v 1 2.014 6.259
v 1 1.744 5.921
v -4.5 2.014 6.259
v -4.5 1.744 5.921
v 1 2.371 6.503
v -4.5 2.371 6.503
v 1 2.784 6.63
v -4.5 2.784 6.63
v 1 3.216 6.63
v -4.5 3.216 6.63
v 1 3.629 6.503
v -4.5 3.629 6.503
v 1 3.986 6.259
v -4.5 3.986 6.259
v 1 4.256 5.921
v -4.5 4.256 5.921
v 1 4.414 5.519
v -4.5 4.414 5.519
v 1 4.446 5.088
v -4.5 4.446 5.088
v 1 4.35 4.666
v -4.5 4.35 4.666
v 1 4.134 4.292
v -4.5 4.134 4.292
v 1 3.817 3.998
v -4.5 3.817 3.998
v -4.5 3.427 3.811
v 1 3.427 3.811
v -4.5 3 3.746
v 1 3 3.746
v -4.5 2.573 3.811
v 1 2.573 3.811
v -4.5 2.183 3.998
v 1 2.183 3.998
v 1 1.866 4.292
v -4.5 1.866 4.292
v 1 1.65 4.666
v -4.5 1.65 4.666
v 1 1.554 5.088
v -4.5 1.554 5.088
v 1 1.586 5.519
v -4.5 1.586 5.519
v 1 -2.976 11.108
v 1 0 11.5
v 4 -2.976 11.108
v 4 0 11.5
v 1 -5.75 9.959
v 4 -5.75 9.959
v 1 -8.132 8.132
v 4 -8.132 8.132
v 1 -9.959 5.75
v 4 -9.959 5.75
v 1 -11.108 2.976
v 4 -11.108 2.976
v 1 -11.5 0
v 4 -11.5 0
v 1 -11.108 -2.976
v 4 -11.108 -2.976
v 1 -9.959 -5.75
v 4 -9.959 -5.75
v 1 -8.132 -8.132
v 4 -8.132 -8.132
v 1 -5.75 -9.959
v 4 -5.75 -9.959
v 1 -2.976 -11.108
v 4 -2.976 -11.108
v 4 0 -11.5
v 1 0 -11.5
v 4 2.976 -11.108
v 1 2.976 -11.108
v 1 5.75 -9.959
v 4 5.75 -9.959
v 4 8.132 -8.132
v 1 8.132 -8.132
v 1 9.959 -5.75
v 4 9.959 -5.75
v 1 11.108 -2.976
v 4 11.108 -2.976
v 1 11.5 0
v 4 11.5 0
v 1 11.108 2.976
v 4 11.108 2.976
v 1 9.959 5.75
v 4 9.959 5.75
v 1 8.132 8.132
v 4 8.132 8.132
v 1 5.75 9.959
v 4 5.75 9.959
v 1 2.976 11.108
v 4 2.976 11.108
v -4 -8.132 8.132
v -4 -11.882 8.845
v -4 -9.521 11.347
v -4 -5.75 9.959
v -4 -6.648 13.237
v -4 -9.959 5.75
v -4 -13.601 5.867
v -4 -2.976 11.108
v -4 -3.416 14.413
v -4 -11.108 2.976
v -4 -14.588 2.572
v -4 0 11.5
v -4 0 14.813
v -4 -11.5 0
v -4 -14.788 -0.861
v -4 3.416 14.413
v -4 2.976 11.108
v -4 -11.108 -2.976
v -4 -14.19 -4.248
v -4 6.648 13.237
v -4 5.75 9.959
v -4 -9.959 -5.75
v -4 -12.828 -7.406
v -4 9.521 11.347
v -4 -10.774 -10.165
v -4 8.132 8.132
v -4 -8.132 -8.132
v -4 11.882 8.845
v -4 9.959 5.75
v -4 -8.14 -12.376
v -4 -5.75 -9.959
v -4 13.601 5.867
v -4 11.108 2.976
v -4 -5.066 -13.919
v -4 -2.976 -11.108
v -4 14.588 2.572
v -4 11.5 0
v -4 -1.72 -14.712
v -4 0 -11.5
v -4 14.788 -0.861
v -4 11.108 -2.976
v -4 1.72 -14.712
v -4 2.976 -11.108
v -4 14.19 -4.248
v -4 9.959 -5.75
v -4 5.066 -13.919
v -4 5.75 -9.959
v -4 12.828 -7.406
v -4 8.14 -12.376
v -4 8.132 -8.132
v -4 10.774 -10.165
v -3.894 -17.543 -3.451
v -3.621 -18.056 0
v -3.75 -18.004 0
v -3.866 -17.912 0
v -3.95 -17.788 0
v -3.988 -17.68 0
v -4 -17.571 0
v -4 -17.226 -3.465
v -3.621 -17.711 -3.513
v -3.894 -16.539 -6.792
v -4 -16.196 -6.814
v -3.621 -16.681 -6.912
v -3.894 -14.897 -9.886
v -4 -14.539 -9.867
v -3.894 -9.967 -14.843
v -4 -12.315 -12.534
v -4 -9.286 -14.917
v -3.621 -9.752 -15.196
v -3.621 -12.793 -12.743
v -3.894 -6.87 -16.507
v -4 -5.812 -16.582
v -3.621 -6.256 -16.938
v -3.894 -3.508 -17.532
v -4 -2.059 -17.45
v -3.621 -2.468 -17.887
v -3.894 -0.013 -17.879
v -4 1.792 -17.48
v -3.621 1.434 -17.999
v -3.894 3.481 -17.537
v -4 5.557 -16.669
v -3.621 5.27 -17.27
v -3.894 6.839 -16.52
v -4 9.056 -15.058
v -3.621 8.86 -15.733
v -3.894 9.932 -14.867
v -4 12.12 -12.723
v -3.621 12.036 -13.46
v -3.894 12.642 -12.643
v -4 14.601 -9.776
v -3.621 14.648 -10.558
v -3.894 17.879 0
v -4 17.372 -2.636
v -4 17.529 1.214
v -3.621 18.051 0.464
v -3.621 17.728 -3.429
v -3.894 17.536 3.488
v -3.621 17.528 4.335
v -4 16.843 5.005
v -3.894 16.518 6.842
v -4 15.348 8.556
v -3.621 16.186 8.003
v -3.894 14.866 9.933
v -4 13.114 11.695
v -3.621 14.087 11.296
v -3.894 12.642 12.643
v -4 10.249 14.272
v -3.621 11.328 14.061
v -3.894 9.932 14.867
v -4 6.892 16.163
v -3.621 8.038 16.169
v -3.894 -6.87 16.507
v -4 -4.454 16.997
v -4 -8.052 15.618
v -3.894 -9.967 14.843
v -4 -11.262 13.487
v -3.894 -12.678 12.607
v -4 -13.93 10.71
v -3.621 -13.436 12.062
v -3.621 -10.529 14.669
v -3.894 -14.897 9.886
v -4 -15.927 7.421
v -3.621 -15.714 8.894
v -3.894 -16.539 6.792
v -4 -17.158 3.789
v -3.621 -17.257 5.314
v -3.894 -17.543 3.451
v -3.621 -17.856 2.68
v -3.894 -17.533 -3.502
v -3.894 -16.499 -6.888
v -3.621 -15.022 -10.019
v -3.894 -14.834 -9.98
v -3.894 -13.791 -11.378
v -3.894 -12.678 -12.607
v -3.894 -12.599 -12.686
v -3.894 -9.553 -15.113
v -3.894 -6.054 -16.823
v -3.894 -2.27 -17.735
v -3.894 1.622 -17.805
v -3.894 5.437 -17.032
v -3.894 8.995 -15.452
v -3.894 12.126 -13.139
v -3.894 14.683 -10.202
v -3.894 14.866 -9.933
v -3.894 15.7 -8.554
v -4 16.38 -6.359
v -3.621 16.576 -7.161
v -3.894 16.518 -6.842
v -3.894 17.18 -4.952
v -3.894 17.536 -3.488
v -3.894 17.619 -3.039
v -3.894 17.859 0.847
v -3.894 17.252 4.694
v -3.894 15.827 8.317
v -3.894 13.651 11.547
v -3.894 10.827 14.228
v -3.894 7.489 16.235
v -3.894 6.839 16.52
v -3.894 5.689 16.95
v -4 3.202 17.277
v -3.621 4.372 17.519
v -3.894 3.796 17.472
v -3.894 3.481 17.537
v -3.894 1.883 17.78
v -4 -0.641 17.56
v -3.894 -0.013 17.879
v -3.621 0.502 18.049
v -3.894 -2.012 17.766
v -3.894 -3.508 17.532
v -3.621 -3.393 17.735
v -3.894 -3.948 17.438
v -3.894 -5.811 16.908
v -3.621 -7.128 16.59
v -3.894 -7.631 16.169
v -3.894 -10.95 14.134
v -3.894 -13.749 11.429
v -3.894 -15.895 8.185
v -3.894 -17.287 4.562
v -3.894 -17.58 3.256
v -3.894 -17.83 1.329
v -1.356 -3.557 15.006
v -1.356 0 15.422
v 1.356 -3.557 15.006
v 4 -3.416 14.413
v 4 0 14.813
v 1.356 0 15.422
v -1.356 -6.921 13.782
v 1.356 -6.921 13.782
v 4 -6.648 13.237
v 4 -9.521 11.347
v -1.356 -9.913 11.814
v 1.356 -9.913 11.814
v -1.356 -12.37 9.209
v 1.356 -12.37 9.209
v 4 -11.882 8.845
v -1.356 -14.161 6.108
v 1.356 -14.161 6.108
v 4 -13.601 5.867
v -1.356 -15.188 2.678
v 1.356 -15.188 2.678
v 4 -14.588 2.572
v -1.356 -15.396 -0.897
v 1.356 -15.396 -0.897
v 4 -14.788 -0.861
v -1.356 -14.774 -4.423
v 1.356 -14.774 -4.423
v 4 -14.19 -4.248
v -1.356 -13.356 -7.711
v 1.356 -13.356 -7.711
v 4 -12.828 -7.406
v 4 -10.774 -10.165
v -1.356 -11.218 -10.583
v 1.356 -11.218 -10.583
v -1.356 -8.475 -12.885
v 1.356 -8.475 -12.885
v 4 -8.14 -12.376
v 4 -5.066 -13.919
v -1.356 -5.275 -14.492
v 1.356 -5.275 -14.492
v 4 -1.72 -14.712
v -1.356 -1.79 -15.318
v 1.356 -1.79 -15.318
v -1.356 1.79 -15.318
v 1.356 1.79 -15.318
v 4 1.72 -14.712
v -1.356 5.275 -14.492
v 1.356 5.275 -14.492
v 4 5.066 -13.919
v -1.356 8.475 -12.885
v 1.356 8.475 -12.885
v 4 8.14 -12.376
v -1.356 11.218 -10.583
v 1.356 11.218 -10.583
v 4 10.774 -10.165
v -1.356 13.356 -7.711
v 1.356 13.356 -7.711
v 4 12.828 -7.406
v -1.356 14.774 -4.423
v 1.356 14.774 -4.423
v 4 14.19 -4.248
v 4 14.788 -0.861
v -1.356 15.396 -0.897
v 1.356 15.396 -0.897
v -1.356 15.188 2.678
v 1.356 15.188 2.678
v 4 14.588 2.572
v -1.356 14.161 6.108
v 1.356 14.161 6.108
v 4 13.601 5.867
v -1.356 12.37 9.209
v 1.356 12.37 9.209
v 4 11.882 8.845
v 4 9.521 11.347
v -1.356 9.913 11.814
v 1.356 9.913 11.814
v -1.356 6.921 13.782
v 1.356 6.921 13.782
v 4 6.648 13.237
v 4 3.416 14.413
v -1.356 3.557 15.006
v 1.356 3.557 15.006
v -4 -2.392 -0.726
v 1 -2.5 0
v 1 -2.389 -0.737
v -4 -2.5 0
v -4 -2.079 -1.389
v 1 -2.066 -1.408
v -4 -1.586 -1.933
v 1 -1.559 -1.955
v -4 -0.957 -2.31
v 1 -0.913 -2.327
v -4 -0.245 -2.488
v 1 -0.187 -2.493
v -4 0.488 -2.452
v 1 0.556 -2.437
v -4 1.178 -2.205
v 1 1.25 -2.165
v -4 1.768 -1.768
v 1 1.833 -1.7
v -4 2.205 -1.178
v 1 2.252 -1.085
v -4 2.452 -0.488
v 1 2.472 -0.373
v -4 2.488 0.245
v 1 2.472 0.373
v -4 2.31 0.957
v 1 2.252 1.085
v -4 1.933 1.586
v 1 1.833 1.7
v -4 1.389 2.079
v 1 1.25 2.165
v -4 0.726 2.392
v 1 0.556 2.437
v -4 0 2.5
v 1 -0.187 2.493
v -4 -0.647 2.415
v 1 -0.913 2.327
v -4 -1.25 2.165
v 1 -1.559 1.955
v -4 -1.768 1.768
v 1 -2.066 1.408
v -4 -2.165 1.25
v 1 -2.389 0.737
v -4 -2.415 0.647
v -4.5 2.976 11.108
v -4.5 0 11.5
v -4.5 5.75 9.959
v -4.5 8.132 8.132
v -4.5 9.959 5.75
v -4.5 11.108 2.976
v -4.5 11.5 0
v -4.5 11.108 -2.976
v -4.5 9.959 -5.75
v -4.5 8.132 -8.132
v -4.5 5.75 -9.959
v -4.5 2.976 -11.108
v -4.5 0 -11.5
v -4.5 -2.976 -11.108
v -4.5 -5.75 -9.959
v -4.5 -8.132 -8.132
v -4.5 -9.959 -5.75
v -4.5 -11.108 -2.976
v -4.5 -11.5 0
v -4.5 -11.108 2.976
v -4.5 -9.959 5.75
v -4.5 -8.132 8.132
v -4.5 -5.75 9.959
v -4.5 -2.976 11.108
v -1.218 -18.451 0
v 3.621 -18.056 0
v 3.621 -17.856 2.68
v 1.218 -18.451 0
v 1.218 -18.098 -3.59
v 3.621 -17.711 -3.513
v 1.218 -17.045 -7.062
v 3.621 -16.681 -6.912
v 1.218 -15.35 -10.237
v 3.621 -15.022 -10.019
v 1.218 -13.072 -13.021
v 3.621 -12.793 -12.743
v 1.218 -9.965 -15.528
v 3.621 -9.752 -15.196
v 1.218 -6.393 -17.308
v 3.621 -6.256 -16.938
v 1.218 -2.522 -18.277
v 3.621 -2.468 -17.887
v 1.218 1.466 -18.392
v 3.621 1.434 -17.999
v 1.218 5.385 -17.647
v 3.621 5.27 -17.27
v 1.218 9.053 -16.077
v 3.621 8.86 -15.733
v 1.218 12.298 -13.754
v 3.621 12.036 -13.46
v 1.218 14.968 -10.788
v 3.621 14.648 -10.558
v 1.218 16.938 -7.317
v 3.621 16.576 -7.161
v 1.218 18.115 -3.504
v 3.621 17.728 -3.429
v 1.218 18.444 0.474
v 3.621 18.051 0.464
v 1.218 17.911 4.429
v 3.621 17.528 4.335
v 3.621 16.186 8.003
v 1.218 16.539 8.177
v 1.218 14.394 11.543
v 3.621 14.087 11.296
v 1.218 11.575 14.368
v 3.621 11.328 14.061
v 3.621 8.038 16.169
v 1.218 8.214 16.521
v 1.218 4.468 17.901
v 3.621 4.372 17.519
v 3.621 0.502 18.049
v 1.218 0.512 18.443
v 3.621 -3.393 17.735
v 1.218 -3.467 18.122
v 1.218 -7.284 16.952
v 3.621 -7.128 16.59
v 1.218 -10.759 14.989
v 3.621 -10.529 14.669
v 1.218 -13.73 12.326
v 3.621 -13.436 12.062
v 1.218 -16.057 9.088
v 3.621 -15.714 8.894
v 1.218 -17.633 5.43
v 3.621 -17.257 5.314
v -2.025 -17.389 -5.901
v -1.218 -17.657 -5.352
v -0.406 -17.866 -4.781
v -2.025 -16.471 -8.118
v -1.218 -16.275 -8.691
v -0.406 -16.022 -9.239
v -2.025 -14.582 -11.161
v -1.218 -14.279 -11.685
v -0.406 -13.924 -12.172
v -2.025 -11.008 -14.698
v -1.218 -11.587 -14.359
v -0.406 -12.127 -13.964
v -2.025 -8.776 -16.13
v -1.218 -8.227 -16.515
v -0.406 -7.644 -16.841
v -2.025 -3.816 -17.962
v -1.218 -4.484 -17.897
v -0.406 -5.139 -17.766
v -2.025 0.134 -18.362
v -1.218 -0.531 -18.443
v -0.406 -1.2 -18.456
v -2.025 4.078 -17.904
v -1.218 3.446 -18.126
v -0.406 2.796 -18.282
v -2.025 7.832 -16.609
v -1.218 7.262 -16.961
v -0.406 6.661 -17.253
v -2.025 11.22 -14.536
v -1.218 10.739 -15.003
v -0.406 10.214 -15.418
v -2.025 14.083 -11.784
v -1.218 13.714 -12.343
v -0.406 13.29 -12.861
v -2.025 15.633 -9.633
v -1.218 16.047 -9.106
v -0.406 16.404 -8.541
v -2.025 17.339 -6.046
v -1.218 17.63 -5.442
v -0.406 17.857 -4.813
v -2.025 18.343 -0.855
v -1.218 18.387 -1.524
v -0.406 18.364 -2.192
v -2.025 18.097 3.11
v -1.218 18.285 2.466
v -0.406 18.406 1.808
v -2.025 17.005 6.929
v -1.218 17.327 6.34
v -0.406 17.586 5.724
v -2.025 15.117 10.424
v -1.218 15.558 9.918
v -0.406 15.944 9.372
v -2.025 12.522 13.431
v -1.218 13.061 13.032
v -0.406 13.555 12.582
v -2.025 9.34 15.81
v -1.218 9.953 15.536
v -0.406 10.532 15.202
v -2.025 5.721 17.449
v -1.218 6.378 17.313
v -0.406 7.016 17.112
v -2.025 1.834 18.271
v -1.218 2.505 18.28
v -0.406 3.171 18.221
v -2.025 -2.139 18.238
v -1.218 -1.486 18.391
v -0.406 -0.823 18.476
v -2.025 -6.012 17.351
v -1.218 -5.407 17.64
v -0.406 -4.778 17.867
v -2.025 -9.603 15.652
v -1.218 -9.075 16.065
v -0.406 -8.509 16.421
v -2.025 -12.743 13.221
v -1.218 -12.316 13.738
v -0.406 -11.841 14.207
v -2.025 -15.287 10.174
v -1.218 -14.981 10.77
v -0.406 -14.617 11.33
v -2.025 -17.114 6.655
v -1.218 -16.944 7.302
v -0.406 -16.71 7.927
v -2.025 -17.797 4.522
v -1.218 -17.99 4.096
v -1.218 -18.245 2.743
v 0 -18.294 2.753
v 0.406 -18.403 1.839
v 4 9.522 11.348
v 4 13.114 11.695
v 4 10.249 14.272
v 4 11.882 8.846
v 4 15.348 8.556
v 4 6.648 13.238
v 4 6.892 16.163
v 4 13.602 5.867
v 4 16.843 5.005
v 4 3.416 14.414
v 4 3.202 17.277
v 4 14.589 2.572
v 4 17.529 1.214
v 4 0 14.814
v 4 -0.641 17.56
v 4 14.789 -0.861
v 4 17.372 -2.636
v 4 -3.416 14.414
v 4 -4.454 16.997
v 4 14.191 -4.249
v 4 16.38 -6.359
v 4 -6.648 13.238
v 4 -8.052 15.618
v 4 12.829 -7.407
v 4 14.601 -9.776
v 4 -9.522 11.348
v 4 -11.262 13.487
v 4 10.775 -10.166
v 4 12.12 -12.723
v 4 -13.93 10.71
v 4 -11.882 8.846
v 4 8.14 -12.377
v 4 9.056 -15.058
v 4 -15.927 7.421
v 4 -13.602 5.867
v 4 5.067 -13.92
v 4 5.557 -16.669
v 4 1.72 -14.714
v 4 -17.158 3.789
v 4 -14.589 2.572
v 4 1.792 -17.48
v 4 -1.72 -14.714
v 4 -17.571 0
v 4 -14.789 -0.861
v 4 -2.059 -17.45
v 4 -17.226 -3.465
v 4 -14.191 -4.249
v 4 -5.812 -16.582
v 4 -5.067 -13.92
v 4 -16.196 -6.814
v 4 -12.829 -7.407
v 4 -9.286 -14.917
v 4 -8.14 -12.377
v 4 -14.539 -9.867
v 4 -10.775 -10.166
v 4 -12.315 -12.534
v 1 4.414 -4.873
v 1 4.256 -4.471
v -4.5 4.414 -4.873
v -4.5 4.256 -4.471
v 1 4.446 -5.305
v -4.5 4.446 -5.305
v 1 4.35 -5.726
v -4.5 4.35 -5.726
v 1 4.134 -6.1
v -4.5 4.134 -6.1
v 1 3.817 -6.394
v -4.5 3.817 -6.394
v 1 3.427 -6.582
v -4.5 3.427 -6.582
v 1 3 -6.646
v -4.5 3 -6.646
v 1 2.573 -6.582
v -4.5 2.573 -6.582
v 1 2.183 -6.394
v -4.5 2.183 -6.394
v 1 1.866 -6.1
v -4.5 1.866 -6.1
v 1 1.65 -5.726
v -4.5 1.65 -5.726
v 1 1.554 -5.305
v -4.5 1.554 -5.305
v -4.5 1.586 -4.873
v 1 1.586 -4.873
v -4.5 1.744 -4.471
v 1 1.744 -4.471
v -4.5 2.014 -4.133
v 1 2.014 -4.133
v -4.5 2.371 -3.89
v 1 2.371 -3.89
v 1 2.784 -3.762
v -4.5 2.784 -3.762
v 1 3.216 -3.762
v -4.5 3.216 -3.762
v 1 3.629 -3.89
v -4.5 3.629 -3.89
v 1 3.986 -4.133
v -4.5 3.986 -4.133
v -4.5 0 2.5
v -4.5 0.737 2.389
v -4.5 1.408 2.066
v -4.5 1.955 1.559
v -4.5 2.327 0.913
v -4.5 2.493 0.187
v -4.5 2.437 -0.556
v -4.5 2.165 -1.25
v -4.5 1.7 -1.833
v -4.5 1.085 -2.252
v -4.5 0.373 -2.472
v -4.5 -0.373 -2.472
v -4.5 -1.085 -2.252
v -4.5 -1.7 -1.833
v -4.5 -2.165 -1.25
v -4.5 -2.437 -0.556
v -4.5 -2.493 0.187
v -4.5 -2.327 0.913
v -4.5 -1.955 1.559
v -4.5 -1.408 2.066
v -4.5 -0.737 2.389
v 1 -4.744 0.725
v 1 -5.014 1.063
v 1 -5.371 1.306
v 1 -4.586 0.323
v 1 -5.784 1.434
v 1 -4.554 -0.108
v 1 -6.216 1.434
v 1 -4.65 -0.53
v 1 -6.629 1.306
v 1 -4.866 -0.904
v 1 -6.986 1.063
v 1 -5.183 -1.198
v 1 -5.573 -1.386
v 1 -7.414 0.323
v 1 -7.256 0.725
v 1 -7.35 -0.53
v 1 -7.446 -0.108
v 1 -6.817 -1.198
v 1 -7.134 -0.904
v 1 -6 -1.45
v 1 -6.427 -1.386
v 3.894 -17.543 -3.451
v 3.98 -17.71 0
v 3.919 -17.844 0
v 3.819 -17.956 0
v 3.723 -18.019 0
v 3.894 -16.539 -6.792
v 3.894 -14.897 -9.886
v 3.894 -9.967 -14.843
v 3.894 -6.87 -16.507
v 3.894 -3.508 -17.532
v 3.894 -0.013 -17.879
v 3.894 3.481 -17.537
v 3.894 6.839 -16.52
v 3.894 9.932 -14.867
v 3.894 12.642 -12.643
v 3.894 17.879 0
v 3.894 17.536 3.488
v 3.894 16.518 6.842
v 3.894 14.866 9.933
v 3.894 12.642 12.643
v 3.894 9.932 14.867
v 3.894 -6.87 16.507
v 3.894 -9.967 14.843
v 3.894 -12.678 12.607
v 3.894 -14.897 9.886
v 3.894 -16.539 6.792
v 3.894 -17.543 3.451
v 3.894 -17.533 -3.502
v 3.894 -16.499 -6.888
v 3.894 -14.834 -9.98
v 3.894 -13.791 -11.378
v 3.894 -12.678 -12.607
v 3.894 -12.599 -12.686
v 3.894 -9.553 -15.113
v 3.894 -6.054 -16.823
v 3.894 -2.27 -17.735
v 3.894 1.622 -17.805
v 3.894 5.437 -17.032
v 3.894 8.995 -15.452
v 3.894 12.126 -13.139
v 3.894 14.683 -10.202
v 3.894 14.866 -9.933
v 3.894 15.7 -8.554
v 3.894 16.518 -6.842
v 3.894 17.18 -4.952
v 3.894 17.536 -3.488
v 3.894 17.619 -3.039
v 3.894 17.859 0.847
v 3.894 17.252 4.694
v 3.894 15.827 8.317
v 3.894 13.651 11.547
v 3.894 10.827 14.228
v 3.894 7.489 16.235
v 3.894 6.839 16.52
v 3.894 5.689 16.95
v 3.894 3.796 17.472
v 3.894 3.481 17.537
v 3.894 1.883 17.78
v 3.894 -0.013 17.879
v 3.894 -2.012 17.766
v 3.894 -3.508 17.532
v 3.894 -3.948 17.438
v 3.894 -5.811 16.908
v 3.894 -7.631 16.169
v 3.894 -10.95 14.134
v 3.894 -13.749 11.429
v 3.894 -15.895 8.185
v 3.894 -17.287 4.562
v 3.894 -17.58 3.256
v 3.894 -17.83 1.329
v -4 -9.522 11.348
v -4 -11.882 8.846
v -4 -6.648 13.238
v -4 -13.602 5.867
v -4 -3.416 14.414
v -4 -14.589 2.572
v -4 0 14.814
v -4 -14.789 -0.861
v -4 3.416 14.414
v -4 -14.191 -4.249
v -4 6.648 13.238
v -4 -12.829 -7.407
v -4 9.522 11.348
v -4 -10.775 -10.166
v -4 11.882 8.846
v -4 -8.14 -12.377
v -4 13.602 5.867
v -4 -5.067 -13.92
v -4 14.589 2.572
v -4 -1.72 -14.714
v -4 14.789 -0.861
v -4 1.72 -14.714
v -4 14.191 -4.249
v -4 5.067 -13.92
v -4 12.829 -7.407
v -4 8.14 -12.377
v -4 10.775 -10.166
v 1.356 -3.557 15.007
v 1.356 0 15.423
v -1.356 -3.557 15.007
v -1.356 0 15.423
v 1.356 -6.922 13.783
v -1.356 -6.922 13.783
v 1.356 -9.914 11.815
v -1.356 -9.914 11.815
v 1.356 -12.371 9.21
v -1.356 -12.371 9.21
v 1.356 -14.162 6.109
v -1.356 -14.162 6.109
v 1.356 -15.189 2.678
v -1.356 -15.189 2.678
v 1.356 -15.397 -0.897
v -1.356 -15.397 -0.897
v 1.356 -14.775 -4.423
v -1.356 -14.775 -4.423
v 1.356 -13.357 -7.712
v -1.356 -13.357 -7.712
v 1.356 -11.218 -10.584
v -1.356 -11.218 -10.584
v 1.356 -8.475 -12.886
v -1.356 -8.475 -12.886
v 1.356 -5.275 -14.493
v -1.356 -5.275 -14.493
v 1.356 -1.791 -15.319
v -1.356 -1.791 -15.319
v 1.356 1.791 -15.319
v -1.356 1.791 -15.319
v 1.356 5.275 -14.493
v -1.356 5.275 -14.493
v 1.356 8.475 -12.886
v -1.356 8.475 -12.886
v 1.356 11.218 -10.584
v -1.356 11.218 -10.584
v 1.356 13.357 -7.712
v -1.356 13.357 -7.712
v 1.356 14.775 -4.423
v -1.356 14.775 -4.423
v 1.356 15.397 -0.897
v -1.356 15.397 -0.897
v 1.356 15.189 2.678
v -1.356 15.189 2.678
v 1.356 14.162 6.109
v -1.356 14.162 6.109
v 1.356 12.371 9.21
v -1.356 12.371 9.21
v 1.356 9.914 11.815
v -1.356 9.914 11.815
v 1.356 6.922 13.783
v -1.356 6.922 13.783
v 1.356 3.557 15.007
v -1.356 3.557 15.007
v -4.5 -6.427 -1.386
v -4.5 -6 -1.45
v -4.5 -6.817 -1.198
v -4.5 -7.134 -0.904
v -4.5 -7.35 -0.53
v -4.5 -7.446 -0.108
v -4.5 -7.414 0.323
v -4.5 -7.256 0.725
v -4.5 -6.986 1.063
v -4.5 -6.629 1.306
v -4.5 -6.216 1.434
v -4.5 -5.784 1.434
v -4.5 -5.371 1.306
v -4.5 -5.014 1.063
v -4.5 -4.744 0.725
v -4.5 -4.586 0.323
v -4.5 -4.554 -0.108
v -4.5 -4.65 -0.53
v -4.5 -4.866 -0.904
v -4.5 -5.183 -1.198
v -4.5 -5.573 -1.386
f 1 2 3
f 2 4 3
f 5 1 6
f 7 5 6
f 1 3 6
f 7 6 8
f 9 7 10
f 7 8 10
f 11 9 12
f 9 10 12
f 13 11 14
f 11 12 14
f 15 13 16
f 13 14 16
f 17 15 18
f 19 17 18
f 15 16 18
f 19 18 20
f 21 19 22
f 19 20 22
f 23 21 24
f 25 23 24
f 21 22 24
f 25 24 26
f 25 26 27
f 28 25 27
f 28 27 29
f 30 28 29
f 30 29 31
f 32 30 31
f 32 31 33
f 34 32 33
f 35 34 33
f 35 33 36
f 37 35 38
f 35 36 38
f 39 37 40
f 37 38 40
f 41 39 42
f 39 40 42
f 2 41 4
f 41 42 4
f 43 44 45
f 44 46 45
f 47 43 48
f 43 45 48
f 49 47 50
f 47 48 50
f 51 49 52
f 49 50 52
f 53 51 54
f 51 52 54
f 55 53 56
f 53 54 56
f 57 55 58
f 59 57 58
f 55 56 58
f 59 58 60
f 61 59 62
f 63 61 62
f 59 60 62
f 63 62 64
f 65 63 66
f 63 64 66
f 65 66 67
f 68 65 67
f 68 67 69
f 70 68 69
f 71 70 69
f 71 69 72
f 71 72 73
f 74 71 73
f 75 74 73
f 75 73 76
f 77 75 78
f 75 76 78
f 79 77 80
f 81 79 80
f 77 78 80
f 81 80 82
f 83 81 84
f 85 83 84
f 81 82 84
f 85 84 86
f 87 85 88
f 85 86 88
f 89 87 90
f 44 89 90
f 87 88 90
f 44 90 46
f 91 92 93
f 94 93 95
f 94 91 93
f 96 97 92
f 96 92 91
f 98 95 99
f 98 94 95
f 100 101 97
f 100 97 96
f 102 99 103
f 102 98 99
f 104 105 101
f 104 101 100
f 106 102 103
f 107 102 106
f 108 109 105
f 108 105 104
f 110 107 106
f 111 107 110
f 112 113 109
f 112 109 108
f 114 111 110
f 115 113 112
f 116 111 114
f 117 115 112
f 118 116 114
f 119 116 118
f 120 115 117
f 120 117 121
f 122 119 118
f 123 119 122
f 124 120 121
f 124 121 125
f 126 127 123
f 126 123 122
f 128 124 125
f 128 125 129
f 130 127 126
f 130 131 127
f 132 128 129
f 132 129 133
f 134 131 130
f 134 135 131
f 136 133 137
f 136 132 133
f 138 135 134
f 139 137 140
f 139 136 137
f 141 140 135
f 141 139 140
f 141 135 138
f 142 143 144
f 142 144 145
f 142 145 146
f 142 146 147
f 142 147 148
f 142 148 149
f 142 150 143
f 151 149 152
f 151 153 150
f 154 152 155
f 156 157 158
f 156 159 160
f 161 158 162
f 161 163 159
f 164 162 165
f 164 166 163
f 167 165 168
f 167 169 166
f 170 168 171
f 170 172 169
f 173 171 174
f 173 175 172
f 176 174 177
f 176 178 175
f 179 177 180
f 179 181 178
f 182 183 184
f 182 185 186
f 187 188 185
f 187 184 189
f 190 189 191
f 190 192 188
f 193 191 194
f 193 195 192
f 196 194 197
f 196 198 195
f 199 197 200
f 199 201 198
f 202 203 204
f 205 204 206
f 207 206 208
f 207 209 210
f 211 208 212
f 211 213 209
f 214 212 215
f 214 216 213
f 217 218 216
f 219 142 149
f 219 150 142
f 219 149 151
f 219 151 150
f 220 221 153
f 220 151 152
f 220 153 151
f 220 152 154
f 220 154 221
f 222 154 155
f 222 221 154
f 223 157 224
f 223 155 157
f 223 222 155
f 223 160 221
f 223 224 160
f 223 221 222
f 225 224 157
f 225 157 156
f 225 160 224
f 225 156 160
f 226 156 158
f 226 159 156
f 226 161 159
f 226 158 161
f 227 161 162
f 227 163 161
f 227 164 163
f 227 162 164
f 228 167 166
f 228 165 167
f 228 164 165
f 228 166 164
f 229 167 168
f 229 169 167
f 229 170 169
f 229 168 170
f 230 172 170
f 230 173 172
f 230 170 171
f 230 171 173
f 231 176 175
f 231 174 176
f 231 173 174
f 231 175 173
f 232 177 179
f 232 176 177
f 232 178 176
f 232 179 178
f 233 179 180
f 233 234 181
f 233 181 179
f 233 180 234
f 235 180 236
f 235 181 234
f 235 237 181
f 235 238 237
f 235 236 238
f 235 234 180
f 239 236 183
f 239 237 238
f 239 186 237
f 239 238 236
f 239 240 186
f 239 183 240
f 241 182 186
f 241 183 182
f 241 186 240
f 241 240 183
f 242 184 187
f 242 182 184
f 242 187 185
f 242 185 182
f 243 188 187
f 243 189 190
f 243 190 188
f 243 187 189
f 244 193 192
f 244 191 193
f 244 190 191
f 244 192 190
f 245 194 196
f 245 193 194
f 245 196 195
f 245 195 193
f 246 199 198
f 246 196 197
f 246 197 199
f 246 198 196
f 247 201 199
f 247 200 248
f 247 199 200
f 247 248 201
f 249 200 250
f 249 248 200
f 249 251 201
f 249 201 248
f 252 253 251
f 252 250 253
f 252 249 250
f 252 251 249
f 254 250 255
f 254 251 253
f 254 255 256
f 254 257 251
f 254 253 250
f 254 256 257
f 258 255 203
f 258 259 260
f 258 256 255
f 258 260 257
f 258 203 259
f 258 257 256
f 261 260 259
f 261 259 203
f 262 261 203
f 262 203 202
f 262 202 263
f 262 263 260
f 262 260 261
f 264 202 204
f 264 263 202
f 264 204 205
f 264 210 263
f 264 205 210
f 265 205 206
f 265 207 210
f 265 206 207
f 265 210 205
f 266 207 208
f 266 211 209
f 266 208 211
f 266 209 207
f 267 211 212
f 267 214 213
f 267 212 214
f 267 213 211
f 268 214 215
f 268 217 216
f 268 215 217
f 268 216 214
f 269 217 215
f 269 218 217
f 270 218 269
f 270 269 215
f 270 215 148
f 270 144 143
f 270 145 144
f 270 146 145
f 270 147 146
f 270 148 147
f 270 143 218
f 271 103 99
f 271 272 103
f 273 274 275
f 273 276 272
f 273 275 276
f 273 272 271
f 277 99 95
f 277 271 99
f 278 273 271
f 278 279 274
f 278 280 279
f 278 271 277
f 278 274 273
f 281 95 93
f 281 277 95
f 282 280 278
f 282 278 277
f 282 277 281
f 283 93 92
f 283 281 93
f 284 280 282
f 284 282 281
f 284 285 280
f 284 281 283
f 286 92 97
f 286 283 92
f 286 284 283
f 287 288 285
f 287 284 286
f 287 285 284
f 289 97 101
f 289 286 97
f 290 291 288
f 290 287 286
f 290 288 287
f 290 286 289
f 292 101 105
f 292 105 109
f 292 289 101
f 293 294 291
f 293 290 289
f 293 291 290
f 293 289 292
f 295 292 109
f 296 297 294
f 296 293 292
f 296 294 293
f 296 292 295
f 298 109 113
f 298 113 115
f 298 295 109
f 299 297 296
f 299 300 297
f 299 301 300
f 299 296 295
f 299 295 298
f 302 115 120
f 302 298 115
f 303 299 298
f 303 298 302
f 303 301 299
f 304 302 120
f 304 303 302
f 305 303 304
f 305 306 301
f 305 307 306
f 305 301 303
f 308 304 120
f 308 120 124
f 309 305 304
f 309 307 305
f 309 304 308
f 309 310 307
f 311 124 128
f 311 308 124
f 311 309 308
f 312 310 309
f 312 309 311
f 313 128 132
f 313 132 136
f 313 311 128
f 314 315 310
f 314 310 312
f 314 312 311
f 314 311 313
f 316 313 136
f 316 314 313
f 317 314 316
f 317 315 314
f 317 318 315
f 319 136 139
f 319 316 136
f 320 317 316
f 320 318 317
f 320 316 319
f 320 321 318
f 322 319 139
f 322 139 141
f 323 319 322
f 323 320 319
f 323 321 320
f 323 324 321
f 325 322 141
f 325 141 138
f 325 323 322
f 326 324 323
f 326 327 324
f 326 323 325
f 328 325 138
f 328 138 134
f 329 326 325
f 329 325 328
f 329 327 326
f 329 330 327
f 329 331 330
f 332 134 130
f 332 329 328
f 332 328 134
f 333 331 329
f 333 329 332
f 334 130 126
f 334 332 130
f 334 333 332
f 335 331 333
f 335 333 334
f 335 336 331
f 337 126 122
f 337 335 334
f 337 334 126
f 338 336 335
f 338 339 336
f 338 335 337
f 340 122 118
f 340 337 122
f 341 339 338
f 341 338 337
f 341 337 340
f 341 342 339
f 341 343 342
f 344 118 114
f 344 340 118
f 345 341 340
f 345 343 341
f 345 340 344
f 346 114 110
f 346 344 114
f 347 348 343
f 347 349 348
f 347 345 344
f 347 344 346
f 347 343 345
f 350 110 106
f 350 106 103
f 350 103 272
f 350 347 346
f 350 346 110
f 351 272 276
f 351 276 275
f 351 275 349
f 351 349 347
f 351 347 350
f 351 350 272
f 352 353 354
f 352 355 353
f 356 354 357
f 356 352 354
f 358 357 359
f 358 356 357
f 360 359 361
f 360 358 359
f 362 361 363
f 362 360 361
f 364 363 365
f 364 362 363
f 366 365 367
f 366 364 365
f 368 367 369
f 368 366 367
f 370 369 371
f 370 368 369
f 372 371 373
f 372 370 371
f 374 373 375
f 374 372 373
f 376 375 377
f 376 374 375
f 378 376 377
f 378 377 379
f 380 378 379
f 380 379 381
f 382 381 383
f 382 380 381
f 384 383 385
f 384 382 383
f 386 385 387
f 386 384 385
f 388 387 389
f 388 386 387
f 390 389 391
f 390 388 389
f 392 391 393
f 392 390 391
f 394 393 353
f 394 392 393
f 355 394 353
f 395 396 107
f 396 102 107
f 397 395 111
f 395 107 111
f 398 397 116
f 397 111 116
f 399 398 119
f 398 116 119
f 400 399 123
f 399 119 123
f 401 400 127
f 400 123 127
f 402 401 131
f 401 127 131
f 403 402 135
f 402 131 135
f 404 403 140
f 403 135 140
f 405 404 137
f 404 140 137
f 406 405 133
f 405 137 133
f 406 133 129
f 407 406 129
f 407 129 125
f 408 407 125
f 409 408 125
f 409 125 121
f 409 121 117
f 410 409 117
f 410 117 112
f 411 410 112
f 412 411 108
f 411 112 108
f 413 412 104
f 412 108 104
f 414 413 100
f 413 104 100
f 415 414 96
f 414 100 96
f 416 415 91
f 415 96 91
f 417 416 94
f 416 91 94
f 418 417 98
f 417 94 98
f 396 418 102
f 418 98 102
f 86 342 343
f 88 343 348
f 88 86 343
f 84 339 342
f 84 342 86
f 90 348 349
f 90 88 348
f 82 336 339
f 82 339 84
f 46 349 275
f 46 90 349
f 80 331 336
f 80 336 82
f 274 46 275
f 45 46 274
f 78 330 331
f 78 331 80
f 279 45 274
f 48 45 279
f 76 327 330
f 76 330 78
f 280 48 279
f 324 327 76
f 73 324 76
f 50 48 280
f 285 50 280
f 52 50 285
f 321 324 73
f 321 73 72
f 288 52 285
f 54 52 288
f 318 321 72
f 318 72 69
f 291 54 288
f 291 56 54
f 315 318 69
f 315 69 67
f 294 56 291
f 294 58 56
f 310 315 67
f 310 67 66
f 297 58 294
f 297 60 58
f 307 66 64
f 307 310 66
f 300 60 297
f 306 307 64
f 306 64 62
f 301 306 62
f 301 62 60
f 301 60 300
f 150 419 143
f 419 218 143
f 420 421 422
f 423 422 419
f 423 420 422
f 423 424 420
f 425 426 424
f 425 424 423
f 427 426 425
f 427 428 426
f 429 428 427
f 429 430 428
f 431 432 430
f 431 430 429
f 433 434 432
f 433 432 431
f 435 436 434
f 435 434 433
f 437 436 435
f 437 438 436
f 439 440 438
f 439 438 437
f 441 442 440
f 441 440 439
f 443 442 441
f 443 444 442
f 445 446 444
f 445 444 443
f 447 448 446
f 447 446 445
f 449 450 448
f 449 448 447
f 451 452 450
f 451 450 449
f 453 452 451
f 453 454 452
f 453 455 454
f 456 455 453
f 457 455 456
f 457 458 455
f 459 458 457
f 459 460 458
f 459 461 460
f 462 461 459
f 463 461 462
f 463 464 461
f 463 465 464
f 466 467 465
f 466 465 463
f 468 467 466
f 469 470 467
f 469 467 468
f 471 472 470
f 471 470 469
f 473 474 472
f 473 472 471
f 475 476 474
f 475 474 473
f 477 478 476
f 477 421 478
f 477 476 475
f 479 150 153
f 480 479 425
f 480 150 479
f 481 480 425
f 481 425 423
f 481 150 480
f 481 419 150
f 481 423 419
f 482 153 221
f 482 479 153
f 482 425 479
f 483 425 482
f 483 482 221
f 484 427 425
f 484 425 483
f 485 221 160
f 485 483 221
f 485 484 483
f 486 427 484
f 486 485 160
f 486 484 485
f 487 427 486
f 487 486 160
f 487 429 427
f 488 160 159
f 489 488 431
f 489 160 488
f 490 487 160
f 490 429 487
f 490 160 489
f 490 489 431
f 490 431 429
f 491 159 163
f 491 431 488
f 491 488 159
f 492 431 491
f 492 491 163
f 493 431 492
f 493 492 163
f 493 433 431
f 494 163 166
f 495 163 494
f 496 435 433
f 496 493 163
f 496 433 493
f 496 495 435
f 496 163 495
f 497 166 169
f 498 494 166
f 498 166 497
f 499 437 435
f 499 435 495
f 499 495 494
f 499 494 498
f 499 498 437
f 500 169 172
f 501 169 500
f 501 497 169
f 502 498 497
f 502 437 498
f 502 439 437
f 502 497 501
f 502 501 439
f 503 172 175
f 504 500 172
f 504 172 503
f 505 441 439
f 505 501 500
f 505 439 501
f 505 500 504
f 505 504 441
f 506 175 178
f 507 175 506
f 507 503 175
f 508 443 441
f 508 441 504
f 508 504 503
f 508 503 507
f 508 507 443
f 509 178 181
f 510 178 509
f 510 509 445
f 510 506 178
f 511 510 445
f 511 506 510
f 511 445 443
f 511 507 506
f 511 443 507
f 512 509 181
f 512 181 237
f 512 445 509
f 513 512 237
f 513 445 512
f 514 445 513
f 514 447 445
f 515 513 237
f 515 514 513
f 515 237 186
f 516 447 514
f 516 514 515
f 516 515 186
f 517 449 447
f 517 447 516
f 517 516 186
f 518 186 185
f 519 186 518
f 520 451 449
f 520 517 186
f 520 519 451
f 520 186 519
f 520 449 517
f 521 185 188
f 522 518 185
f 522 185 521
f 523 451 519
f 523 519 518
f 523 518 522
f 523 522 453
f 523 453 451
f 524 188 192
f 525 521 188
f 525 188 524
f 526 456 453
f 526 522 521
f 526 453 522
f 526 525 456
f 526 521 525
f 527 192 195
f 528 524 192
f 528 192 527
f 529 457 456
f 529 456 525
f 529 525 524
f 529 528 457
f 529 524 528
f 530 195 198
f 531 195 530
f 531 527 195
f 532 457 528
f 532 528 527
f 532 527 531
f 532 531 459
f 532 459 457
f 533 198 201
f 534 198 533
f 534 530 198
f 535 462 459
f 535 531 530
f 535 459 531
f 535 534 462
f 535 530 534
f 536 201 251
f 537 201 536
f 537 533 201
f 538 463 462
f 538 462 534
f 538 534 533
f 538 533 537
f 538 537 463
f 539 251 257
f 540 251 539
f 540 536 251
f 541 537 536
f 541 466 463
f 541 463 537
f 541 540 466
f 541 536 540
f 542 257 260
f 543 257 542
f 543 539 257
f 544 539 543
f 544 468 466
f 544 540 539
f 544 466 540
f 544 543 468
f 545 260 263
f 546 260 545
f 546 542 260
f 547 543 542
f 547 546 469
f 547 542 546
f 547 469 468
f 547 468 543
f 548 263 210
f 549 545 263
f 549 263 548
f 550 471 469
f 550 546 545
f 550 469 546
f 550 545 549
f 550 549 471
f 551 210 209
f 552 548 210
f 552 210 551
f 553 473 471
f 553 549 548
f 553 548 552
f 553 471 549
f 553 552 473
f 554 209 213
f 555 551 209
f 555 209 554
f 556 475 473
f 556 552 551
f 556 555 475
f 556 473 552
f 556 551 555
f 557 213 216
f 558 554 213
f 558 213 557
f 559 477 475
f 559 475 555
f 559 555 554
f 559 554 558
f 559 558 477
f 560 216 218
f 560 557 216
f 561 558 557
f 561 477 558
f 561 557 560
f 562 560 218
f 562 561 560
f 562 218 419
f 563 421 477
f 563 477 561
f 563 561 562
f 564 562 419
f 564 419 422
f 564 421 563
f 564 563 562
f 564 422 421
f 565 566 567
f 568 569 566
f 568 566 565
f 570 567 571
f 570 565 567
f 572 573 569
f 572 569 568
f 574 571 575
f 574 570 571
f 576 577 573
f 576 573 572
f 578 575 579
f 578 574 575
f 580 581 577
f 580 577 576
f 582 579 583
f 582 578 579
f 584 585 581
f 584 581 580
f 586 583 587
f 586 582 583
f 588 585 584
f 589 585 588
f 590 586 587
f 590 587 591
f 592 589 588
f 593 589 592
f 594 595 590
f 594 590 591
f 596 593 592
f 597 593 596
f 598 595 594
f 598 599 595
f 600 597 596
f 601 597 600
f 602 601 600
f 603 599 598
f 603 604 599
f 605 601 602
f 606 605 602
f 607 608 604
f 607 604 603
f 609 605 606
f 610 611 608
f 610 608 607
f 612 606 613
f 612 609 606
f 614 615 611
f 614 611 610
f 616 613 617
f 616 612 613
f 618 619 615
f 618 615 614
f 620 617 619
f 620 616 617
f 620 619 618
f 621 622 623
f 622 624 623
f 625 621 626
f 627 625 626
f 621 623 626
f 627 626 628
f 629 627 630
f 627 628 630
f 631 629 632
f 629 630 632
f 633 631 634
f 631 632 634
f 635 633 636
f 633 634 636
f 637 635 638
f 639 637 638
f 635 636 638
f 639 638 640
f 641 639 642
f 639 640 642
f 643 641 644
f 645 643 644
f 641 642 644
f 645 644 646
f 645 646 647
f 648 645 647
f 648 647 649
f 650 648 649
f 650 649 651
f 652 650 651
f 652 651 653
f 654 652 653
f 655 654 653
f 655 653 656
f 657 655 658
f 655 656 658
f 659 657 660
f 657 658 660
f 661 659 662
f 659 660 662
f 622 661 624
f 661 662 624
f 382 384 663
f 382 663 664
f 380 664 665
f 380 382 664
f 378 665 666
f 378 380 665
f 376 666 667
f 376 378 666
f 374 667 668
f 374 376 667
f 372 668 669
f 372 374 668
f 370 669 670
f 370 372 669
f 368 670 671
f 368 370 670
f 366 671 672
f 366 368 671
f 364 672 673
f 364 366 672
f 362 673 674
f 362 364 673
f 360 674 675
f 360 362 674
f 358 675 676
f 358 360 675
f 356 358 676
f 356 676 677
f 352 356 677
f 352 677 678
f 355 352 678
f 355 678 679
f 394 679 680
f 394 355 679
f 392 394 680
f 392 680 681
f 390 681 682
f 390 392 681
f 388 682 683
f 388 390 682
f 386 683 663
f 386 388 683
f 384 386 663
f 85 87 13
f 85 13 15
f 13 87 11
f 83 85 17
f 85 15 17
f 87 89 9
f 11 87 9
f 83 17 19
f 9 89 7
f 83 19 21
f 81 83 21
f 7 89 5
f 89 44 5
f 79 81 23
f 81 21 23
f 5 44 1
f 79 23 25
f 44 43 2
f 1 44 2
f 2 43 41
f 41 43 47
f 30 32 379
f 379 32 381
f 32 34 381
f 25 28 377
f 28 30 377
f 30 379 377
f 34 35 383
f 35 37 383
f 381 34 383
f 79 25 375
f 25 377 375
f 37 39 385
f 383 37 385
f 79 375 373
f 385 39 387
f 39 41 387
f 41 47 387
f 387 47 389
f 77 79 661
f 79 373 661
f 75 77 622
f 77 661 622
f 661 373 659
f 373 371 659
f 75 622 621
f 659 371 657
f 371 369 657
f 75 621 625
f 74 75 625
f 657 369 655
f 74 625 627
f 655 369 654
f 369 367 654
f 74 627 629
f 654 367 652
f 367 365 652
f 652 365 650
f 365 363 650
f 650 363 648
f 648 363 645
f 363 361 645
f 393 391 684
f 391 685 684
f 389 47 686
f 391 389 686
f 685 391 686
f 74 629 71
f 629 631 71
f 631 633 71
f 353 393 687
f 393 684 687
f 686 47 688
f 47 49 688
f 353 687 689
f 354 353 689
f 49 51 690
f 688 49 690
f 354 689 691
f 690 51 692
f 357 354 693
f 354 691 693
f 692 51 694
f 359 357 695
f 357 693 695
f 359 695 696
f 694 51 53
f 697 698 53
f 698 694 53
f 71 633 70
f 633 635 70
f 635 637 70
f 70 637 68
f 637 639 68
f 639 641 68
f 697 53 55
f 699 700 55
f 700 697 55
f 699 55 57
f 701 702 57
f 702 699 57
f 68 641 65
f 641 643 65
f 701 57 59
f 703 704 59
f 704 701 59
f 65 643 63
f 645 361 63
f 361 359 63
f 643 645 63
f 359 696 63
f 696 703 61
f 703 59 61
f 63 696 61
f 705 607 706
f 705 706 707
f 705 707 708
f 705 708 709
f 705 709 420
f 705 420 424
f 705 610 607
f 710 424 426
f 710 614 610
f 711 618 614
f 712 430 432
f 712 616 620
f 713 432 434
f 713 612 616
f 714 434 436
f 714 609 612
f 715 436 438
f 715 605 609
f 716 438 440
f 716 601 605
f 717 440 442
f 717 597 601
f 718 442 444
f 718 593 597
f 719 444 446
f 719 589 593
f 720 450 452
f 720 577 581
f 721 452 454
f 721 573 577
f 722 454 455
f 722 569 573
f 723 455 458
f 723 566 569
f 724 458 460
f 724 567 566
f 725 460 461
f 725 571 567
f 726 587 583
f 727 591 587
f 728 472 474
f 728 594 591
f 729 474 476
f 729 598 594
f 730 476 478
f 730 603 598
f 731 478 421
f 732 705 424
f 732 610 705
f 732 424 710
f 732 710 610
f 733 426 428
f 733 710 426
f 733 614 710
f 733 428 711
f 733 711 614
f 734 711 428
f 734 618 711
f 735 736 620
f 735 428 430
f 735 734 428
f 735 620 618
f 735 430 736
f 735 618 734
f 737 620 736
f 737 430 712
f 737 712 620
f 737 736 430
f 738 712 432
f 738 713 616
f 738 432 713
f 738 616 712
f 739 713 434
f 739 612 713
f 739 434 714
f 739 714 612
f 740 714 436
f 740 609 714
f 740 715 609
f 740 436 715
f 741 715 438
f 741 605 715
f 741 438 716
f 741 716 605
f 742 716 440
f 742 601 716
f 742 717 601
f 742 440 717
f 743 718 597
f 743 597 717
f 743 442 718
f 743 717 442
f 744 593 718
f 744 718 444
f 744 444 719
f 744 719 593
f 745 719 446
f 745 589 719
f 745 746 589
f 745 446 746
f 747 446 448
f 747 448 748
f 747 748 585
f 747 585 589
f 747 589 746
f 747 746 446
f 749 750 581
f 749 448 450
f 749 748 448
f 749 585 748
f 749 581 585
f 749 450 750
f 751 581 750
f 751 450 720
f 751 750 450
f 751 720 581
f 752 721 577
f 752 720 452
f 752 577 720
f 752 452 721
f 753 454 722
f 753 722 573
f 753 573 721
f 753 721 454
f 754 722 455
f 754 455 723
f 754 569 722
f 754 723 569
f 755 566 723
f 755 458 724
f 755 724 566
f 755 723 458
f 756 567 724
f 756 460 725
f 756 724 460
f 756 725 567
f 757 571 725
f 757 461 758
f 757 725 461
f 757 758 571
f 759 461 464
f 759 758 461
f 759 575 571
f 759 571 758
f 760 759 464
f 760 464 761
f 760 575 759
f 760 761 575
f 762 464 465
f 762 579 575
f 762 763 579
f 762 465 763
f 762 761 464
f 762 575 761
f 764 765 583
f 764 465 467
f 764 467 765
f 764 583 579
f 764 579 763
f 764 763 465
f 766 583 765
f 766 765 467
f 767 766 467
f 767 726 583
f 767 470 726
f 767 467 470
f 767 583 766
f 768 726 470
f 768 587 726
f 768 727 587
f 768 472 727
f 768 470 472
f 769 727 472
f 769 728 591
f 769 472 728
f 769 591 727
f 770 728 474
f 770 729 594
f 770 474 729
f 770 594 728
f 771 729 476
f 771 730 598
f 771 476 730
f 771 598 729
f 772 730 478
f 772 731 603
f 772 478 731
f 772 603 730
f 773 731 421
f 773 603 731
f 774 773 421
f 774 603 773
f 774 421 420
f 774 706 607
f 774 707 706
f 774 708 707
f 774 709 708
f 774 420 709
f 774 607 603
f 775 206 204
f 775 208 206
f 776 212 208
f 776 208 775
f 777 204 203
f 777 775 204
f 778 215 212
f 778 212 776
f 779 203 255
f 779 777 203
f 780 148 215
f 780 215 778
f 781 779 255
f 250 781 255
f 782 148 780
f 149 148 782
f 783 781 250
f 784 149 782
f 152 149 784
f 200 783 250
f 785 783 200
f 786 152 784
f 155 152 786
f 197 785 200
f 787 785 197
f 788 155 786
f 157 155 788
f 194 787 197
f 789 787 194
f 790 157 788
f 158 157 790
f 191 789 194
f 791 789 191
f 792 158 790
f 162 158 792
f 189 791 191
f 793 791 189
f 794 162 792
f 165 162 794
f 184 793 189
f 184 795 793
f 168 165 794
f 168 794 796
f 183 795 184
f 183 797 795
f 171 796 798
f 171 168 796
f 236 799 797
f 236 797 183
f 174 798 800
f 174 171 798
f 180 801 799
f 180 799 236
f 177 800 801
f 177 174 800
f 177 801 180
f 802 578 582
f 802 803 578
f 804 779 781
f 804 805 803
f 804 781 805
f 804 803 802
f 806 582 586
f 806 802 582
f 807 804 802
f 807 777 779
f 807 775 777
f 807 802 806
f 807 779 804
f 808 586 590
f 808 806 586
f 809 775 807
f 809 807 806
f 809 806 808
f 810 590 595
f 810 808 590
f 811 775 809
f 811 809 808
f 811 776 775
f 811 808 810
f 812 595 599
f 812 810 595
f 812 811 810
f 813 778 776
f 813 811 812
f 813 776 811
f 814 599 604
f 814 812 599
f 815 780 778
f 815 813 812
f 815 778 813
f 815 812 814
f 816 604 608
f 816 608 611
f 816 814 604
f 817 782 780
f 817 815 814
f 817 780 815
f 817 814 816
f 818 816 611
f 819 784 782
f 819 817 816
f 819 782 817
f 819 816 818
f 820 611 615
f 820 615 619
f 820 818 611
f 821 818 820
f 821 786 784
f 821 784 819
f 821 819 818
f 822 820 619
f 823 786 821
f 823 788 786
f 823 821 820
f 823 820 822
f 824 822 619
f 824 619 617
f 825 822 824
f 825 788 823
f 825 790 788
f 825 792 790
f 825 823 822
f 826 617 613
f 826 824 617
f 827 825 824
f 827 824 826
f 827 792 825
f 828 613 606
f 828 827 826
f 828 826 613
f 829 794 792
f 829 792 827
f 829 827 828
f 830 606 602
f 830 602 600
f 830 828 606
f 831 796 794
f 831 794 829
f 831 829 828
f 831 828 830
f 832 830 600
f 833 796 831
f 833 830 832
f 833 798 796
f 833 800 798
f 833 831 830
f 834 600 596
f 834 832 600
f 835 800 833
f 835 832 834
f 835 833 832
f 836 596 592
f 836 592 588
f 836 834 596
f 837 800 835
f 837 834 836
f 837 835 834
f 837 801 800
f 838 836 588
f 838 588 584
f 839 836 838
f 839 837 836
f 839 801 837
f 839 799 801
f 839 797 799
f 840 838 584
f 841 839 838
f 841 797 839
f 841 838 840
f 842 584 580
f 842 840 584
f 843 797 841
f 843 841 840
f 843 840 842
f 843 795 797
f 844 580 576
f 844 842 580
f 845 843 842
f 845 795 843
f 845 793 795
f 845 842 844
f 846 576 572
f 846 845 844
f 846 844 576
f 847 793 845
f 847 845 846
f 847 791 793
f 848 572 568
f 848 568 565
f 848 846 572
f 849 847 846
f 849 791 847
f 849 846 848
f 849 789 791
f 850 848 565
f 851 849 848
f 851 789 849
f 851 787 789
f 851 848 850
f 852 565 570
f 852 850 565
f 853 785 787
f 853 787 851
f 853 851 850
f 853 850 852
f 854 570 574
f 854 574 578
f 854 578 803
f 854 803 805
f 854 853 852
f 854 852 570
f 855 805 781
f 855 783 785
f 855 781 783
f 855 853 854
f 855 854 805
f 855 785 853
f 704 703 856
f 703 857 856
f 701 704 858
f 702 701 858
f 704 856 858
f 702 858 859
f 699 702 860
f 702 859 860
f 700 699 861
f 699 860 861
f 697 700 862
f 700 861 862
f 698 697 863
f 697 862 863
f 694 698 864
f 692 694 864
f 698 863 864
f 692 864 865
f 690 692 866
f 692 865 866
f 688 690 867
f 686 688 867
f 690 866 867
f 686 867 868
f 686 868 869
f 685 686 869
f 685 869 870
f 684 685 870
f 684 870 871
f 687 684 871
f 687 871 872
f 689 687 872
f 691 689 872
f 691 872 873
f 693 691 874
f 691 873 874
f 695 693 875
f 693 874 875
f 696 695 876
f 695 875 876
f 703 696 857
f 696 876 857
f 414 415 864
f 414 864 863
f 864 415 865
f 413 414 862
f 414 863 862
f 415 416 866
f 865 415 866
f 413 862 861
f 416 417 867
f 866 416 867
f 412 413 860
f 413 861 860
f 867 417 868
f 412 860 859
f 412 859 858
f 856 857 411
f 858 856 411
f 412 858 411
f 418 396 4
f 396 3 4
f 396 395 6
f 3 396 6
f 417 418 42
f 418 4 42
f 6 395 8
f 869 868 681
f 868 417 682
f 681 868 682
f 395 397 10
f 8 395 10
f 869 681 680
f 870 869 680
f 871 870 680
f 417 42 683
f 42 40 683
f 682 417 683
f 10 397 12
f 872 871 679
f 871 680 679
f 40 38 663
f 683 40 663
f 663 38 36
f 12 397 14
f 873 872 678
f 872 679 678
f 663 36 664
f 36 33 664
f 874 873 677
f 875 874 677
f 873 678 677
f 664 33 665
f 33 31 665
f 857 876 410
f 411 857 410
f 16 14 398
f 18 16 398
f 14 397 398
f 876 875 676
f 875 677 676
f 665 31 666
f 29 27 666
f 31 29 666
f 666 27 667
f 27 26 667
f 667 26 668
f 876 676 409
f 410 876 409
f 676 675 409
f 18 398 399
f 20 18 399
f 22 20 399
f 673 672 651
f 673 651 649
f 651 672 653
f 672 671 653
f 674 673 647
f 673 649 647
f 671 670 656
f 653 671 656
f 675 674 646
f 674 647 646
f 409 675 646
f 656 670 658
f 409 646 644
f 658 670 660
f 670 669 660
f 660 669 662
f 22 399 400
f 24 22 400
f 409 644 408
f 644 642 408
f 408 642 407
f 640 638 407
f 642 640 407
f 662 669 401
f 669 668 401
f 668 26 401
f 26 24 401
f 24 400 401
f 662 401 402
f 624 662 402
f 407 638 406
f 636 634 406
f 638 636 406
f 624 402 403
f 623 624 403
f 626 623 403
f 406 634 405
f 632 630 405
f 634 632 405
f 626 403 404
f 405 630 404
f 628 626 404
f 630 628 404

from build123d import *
from build123d.topology import SkipClean

# Parameters (mm, degrees)
CONG_1_R                     = 0.5
ESQUISSE4_W                  = 0.5
ESQUISSE4_H                  = 9
ESQUISSE6_W                  = 3
ESQUISSE6_H                  = 11.5
ESQUISSE8_W                  = 1.45
ESQUISSE8_H                  = 5.5
R_P_TITION_CIRCULAIRE1_COUNT = 3


with BuildPart() as part:
    # Esquisse2 → Révolution1 (revolve)
    with BuildSketch(Plane.XY, mode=Mode.PRIVATE) as r_volution1_sk:
        with BuildLine():
            Line((4, 2.5), (-4, 2.5))
            Line((-4, 2.5), (-4, 17.956832295))
            ThreePointArc((-4, 17.956832295), (0, 18.5), (4, 17.956832295))
            Line((4, 17.956832295), (4, 2.5))
        make_face()
    revolve(r_volution1_sk.sketch.rotate(Axis((-12.5, 0, 0), (1, 0, 0)), 180), axis=Axis((-12.5, 0, 0), (1, 0, 0)))

    # Esquisse3 → Enlèvement de matière-Révolution1 (revolve, cut)
    with BuildSketch(Plane.XY, mode=Mode.PRIVATE) as enl_vement_de_mati_re_r_volution1_sk:
        with BuildLine():
            Line((-4, 14.813708499), (-4, 14.812647833))
            ThreePointArc((-4, 14.812647833), (0, 15.499), (4, 14.812647833))
            Line((4, 14.812647833), (4, 14.813708499))
            ThreePointArc((4, 14.813708499), (0, 15.5), (-4, 14.813708499))
        make_face()
    revolve(enl_vement_de_mati_re_r_volution1_sk.sketch.rotate(Axis((-4, 0, 0), (1, 0, 0)), 90), axis=Axis((-4, 0, 0), (1, 0, 0)), mode=Mode.SUBTRACT)


with BuildPart() as enl_vement_de_mati_re_r_volution1_piece:
    # of the separate pieces the step leaves, piece 1, a body of its own (enl_vement_de_mati_re_r_volution1_pieces)
    add(part.part.solids().sort_by_distance((4, 0, 14.812647833))[0])

    # Esquisse4 → Révolution2 (revolve)
    with SkipClean():  # the faces are left unmerged after this step: merging them gives an invalid solid
        with BuildSketch(Plane.XY, mode=Mode.PRIVATE) as r_volution2_sk:
            with Locations((-4.25, 7)):
                Rectangle(ESQUISSE4_W, ESQUISSE4_H)
        revolve(r_volution2_sk.sketch.rotate(Axis((4, 0, 0), (-1, 0, 0)), 270), axis=Axis((4, 0, 0), (-1, 0, 0)))

    # Esquisse6 → Enlèvement de matière-Révolution2 (revolve, cut)
    with SkipClean():  # the faces are left unmerged after this step: merging them gives an invalid solid
        with BuildSketch(Plane.XY, mode=Mode.PRIVATE) as enl_vement_de_mati_re_r_volution2_sk:
            with Locations((2.5, 5.75)):
                Rectangle(ESQUISSE6_W, ESQUISSE6_H)
        revolve(enl_vement_de_mati_re_r_volution2_sk.sketch.rotate(Axis((1, 0, 0), (1, 0, 0)), 90), axis=Axis((1, 0, 0), (1, 0, 0)), mode=Mode.SUBTRACT)

    # Esquisse8 → Diamètre du perçage Ø3.5 (3.5)1 (revolve, cut)
    with SkipClean():  # the faces are left unmerged after this step: merging them gives an invalid solid
        with BuildSketch(Plane(origin=(1, -6, 0), x_dir=(0, 0, -1), z_dir=(0, 1, 0))):
            with Locations((0.725, 2.75)):
                Rectangle(ESQUISSE8_W, ESQUISSE8_H)
        diam_tre_du_per_age_3_5_3_5_1 = revolve(axis=Axis((7.35, -6, 0), (-1, 0, 0)), mode=Mode.SUBTRACT)

    # Répétition circulaire1: Diamètre du perçage Ø3.5 (3.5)1 ×3 about axis
    with SkipClean():  # the faces are left unmerged after this step: merging them gives an invalid solid
        r_p_tition_circulaire1_axis = Axis((0, 0, 0), (1, 0, 0))
        for i in range(1, R_P_TITION_CIRCULAIRE1_COUNT):
            add(diam_tre_du_per_age_3_5_3_5_1.rotate(r_p_tition_circulaire1_axis, i * 360 / R_P_TITION_CIRCULAIRE1_COUNT), mode=Mode.SUBTRACT)


with BuildPart() as enl_vement_de_mati_re_r_volution1_pi_2:
    # of the separate pieces the step leaves, piece 2, a body of its own (enl_vement_de_mati_re_r_volution1_pieces)
    add(part.part.solids().sort_by_distance((4, -17.956832295, 0))[0])

    # Congé1
    cong_1_edges = [enl_vement_de_mati_re_r_volution1_pi_2.edges().sort_by_distance(p)[0] for p in [
        (-4, 17.956832295, 0),
        (4, 17.956832295, 0),
    ]]
    fillet(cong_1_edges, radius=CONG_1_R)


solid = Compound([enl_vement_de_mati_re_r_volution1_piece.part, enl_vement_de_mati_re_r_volution1_pi_2.part])
